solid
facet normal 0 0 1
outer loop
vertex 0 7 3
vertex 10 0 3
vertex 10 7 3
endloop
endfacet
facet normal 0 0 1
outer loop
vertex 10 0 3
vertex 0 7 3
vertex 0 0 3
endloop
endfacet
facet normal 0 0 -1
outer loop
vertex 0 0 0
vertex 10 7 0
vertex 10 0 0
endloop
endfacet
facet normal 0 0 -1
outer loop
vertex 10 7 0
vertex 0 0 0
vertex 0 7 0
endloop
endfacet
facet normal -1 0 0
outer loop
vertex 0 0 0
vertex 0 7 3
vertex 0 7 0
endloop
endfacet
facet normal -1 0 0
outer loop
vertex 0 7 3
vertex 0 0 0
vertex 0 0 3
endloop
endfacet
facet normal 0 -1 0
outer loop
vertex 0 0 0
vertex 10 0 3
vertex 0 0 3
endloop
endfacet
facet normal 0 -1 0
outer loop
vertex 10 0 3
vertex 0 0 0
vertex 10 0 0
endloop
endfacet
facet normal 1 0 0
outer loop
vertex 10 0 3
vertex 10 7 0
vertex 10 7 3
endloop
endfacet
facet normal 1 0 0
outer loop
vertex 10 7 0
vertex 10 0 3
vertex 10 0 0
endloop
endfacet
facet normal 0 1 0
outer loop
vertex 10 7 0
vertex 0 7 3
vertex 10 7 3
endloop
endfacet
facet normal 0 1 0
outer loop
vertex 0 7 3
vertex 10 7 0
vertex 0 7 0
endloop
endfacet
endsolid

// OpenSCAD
translate([1.0, 2.5, 1.5]) color([0.9493092651810784, 0.9246190463677613, 0.3951154575230438]) cube([2, 5, 3], center=true);
translate([3.0, 2.5, 1.5]) color([0.3612783181755085, 0.11615210489091876, 0.0037403702712440756]) cube([2, 5, 3], center=true);
translate([5.0, 2.5, 1.5]) color([0.2703277384724262, 0.6403732426441148, 0.29252642189785794]) cube([2, 5, 3], center=true);
translate([7.0, 2.5, 1.5]) color([0.9007258804640697, 0.14067978971908934, 0.5728503338092871]) cube([2, 5, 3], center=true);
translate([9.0, 2.5, 1.5]) color([0.1912043400515635, 0.43401891336511733, 0.7163457448050065]) cube([2, 5, 3], center=true);
translate([2.5, 6.0, 1.5]) color([0.3841301513333275, 0.33069552050314754, 0.6480049557775331]) cube([5, 2, 3], center=true);
translate([7.5, 6.0, 1.5]) color([0.6874717059379091, 0.14801928734251768, 0.93323205939552]) cube([5, 2, 3], center=true);
